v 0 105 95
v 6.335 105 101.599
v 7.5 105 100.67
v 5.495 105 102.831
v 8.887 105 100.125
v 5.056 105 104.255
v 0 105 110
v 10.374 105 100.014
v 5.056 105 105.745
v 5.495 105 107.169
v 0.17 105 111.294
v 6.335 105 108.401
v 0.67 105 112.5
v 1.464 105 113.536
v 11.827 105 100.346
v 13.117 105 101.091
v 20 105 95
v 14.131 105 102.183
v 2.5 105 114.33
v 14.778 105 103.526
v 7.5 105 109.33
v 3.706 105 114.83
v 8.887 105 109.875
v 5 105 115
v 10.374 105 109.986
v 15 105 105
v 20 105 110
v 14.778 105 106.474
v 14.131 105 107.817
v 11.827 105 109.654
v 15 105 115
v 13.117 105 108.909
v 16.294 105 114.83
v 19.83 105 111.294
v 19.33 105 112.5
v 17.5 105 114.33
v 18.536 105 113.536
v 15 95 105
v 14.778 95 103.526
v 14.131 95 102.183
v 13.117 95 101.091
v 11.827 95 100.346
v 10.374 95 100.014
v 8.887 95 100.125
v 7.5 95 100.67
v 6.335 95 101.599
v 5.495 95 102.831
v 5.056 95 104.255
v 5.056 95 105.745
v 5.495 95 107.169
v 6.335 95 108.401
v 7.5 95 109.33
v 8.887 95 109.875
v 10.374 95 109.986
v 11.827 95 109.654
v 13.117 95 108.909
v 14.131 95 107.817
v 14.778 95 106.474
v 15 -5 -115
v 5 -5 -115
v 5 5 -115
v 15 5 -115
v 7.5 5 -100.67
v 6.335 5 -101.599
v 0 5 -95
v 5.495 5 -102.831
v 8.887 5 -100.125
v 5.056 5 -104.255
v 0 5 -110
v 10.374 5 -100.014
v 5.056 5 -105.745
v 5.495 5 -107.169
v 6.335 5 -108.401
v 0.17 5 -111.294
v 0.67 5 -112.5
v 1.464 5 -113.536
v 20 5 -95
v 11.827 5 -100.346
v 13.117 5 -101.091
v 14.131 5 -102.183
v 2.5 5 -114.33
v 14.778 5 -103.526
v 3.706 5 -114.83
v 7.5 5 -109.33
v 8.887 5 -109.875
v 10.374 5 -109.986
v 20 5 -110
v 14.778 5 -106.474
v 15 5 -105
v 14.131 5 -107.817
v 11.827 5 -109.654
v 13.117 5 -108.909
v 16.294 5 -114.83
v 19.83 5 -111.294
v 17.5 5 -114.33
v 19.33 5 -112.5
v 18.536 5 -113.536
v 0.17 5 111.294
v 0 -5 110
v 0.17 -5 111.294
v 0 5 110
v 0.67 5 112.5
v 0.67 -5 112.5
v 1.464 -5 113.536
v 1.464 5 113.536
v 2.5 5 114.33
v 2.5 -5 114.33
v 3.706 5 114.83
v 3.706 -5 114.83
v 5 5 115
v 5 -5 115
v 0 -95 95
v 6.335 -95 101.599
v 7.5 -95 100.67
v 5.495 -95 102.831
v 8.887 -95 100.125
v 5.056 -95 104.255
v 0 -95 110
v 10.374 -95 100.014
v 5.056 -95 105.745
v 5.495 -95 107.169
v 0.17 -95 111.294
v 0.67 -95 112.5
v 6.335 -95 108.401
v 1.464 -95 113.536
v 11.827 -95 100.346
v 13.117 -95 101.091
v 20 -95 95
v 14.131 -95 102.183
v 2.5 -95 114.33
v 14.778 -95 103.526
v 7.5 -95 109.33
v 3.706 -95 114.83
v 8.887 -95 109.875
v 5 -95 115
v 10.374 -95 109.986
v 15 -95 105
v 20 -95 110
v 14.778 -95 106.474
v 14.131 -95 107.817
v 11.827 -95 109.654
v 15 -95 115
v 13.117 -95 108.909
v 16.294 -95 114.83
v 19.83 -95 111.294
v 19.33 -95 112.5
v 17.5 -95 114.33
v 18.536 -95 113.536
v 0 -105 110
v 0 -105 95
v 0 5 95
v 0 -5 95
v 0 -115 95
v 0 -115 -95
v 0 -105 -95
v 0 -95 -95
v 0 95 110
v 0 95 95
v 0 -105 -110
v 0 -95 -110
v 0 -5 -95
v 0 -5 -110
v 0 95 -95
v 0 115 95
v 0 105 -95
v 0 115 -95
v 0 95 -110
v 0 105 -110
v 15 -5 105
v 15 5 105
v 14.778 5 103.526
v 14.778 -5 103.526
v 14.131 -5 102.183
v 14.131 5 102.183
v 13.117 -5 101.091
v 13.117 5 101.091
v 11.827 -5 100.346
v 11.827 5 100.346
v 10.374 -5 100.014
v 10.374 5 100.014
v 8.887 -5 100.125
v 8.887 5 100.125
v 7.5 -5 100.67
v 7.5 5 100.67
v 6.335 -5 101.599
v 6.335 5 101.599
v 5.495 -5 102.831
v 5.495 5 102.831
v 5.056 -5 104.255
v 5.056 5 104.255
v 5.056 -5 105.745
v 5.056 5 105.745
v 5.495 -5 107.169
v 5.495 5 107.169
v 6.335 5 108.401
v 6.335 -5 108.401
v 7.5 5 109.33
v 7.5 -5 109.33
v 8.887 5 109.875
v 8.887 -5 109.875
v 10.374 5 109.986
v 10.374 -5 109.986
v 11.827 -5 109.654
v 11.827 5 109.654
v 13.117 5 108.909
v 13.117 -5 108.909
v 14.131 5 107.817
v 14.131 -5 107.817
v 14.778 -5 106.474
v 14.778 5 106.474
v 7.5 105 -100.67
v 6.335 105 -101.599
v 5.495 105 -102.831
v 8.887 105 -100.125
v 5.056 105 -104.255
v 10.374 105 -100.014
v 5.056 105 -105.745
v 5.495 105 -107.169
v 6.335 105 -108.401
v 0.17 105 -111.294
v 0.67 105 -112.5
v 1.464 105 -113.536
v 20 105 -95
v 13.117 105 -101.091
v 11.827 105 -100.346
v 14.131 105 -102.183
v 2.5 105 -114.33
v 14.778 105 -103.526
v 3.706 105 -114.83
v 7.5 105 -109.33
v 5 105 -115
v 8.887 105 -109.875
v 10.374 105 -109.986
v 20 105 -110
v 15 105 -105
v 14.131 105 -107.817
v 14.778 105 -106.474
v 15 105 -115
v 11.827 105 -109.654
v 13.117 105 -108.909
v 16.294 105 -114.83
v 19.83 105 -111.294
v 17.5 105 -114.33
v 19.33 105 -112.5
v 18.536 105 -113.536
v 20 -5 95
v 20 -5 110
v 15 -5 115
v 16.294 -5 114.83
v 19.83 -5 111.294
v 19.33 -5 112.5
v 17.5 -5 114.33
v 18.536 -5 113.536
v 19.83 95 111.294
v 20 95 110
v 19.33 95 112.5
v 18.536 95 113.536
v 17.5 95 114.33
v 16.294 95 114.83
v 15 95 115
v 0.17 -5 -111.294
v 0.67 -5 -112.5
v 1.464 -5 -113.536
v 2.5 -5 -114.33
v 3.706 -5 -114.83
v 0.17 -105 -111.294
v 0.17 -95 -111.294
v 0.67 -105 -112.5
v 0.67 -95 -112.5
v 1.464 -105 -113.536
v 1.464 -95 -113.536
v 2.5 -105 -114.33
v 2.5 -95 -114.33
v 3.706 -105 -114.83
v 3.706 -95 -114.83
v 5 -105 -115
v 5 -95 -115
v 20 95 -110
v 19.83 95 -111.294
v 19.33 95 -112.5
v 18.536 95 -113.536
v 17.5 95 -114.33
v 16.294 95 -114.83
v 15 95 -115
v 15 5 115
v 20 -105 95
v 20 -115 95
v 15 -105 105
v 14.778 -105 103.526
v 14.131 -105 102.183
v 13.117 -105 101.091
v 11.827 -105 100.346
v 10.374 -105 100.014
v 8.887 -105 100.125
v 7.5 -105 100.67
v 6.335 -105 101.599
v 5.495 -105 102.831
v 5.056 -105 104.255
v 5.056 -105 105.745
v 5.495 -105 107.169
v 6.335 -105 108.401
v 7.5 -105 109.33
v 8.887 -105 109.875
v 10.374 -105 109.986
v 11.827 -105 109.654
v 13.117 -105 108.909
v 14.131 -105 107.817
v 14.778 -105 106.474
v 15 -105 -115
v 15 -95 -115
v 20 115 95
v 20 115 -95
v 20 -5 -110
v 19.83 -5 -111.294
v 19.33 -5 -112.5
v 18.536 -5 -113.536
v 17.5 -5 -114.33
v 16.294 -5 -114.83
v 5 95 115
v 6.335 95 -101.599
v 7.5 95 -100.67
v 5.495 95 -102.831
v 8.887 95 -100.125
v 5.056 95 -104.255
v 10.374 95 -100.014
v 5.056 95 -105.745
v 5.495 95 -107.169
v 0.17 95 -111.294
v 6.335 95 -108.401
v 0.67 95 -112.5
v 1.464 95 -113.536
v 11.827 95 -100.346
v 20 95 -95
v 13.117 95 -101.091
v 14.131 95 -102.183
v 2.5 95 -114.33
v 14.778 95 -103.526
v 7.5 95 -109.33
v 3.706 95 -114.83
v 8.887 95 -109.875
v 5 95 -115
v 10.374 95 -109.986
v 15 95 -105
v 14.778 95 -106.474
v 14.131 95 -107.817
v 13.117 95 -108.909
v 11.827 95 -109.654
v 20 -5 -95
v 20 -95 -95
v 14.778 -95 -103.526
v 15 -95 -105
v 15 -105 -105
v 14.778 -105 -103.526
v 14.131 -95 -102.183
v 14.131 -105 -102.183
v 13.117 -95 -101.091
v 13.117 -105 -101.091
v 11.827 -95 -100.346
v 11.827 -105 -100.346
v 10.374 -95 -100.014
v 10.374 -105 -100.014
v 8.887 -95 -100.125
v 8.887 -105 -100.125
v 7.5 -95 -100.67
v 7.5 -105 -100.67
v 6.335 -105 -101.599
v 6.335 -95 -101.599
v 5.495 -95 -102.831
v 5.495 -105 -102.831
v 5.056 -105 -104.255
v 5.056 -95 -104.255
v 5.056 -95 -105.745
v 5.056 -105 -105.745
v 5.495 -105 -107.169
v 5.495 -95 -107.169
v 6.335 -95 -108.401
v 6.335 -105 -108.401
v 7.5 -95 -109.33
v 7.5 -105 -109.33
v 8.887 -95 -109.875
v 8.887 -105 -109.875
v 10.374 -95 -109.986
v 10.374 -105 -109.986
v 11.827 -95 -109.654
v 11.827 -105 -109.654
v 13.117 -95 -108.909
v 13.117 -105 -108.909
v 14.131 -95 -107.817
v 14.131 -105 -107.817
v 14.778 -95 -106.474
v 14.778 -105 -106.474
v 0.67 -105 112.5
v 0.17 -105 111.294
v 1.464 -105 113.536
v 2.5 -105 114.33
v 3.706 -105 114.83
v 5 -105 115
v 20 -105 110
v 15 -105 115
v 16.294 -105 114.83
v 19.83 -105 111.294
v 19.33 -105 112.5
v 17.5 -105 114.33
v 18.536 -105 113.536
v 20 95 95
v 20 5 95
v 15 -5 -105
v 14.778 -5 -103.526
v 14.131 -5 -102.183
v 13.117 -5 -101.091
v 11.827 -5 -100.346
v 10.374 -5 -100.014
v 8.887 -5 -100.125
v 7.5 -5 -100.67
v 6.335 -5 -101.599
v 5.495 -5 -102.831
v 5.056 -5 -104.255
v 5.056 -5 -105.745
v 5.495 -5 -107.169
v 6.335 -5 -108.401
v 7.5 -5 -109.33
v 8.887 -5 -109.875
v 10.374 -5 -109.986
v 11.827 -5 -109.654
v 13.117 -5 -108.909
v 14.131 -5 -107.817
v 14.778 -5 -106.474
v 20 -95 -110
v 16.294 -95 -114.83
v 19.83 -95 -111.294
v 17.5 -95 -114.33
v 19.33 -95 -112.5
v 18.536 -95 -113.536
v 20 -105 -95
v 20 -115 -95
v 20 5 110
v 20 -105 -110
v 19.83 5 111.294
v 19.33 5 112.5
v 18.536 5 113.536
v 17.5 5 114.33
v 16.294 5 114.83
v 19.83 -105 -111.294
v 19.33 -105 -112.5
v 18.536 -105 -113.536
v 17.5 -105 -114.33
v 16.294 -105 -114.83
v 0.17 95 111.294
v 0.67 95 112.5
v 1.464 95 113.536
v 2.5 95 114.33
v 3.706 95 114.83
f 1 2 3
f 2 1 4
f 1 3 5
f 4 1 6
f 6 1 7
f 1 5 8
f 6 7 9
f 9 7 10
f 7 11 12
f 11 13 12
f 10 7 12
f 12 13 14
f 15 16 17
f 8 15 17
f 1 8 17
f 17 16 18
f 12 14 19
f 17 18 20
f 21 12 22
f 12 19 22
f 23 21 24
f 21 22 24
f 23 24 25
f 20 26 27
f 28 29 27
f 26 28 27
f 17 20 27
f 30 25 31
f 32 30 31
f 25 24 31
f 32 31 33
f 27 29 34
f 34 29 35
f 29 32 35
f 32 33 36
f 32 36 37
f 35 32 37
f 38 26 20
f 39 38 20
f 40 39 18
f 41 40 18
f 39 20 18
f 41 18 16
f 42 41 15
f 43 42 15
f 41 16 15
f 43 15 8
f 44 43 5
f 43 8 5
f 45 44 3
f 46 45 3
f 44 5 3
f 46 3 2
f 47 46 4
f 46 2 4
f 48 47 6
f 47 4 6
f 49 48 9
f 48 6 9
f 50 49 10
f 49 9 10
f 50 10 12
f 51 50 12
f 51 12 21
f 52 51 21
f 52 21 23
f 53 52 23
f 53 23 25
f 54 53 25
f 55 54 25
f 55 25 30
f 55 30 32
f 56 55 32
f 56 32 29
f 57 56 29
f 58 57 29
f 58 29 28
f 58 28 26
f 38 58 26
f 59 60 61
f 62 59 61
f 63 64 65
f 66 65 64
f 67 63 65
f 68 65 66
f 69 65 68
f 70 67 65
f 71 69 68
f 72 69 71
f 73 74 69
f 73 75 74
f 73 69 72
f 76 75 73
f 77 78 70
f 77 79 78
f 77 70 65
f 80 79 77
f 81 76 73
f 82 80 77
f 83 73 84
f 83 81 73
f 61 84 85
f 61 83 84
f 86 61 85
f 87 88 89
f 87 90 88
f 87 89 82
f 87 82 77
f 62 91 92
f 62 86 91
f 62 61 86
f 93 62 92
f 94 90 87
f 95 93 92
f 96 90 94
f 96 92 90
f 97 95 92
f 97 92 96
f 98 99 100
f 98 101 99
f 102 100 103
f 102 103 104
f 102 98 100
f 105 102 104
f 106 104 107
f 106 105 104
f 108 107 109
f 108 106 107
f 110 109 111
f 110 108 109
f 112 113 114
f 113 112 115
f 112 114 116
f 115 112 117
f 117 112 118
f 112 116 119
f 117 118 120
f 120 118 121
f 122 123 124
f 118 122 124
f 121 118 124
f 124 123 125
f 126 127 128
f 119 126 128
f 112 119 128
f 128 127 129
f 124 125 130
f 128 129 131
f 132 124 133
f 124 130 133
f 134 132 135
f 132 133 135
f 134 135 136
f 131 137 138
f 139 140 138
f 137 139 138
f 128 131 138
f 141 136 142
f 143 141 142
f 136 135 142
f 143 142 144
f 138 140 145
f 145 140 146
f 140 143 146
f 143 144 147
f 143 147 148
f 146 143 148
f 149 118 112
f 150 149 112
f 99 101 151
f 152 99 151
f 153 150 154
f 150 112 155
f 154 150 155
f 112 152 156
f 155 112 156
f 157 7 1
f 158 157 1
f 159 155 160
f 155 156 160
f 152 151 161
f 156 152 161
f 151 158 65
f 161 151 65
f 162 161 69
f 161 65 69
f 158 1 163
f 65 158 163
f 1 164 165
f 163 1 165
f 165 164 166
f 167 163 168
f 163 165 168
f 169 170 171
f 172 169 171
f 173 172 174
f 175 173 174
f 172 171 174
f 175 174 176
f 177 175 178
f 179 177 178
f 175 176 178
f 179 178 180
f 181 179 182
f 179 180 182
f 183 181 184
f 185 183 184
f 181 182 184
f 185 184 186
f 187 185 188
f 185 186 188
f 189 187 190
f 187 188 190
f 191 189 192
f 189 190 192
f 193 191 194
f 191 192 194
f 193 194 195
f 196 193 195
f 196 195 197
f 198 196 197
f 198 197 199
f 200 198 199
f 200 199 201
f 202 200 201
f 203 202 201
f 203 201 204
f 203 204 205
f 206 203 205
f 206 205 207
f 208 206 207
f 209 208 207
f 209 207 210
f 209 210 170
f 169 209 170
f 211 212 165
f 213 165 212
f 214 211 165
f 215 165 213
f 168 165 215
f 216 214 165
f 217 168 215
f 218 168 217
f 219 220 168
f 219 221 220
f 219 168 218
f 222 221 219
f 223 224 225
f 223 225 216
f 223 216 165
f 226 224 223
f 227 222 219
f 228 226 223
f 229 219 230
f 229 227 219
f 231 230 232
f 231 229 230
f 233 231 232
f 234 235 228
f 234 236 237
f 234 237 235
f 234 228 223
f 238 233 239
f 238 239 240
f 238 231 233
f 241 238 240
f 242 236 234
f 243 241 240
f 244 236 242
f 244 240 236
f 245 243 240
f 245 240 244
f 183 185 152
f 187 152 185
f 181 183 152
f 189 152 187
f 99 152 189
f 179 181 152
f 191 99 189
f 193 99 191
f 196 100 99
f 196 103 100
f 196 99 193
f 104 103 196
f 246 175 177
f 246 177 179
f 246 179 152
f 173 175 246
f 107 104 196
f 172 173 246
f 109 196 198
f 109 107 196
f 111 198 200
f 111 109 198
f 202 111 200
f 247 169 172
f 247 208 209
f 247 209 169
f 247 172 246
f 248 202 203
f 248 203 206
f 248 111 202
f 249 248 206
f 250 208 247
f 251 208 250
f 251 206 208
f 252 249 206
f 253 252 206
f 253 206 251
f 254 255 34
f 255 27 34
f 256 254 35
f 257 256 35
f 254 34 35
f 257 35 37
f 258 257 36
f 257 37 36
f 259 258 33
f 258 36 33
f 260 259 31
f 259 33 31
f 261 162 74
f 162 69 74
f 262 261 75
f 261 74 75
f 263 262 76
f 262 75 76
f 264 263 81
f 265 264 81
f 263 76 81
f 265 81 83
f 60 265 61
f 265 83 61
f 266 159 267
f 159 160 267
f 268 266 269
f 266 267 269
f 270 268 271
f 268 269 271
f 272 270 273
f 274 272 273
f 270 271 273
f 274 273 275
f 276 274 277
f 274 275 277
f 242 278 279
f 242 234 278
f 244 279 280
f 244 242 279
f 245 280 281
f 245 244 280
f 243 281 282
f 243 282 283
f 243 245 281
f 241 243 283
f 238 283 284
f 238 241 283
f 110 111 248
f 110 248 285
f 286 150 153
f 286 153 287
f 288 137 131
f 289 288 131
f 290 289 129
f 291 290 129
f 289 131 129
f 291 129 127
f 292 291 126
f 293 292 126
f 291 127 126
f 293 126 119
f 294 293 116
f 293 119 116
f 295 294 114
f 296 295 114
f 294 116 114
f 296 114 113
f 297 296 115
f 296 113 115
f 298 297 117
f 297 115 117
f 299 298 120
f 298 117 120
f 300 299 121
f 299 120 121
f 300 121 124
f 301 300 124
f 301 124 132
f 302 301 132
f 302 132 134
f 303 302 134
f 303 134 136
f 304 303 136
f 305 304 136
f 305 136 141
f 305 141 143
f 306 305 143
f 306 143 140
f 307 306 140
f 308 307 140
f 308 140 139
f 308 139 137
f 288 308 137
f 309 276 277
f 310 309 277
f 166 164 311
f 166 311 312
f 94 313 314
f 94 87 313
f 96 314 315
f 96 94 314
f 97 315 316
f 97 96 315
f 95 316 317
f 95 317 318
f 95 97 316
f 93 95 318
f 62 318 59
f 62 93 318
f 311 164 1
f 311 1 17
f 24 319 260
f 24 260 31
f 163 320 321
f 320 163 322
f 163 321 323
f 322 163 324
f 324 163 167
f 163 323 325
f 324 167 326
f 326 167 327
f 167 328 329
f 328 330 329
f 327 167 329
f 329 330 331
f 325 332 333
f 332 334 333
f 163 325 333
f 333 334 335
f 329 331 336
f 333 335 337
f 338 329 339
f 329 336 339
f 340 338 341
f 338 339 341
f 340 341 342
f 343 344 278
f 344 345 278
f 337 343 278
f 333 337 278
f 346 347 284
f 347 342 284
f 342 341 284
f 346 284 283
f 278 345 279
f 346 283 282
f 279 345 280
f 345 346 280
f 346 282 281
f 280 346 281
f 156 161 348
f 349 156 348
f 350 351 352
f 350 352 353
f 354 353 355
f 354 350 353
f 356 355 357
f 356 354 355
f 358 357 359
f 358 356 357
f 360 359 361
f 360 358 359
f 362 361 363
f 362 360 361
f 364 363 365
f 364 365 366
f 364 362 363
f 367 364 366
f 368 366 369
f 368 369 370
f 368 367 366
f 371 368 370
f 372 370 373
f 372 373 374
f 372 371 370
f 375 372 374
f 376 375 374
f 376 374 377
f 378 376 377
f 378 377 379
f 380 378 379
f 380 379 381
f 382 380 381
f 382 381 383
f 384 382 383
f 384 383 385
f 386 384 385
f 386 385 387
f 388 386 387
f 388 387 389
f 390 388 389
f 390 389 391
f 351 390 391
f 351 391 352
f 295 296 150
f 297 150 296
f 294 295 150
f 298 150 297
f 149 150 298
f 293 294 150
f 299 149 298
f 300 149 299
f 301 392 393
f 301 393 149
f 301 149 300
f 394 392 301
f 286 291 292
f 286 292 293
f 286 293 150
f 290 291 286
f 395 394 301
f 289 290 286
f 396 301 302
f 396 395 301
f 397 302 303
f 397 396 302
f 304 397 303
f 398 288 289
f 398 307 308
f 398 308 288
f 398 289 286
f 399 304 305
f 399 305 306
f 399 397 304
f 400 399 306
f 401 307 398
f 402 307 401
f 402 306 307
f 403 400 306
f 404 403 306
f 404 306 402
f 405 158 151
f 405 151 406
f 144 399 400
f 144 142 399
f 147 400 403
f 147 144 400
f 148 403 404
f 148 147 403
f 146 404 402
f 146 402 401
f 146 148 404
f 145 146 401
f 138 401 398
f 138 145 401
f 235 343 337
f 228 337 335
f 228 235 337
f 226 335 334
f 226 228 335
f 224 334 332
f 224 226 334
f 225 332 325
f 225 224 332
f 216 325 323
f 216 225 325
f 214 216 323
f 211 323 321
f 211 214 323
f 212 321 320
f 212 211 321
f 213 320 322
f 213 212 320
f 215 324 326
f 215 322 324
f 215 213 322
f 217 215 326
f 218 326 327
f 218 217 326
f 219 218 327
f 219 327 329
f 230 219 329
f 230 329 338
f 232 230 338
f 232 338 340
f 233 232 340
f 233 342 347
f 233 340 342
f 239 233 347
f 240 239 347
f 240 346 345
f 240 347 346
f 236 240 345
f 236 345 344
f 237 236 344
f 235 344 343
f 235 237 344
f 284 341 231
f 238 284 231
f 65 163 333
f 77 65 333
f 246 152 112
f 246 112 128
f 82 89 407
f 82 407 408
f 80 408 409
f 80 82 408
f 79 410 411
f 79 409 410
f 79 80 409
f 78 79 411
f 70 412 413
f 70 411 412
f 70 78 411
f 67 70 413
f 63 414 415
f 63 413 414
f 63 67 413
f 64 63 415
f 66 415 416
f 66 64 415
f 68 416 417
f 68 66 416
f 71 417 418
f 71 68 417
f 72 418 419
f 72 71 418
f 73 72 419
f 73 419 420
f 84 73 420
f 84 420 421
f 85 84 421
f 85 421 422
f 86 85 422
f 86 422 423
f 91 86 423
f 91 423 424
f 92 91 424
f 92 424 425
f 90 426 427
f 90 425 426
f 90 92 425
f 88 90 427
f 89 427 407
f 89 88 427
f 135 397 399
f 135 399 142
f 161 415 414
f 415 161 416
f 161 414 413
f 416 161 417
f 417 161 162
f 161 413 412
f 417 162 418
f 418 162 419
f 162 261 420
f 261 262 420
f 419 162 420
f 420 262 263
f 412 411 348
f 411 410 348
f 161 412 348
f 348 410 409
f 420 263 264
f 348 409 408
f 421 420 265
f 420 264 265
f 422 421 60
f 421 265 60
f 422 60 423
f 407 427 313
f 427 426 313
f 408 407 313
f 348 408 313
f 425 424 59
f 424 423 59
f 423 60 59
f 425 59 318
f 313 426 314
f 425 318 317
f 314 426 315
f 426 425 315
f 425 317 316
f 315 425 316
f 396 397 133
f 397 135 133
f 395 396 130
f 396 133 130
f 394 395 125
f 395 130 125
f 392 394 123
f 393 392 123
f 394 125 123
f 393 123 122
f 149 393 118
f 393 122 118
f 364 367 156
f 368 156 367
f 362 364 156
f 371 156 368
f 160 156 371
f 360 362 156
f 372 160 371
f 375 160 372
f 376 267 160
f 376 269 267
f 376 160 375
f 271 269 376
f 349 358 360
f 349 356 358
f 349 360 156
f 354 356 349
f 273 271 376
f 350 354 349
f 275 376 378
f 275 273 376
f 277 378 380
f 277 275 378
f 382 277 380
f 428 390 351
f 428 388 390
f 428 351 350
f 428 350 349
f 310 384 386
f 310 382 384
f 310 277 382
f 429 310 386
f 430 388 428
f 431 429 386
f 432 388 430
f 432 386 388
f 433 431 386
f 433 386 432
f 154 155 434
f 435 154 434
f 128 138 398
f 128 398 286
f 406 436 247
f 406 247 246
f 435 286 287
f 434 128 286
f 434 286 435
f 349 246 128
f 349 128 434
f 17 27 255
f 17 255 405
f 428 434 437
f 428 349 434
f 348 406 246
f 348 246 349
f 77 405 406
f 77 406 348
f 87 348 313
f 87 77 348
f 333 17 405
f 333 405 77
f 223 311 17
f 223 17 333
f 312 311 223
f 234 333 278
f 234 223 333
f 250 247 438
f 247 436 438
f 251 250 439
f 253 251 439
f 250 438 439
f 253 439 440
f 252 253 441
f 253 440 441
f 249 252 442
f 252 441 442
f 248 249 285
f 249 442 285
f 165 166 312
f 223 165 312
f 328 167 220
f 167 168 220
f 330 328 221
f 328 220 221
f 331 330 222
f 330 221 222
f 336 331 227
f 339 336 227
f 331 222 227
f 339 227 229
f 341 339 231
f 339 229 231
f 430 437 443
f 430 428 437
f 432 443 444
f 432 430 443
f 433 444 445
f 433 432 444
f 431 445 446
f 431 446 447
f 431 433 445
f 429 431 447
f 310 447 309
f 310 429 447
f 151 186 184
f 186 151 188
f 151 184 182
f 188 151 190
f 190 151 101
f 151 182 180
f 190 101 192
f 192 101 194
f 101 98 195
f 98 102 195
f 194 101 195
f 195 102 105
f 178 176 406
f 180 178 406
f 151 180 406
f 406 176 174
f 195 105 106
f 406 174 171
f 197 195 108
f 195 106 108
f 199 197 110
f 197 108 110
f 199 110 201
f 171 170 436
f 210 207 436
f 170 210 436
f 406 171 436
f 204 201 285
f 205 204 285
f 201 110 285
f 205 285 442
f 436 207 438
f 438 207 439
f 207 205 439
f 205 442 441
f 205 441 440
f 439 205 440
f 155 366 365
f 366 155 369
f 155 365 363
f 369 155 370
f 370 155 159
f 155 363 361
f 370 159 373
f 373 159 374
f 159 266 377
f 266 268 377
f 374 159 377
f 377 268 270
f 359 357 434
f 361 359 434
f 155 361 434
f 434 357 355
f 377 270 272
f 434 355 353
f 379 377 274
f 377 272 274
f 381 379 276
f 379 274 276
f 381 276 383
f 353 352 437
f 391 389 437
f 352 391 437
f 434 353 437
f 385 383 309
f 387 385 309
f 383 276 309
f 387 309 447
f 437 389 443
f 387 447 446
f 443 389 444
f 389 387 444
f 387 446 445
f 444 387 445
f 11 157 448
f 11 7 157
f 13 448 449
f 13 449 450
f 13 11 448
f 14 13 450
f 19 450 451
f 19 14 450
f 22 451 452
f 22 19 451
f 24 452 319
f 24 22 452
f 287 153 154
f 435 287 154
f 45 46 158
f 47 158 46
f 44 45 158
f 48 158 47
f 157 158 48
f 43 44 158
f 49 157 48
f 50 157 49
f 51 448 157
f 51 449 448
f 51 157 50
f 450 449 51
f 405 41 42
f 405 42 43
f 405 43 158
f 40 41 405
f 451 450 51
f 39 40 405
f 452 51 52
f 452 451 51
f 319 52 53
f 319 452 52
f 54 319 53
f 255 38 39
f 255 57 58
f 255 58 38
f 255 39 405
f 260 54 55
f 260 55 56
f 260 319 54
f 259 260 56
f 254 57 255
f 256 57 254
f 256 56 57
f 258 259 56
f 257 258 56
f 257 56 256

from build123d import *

# Parameters (mm, degrees)
SKETCH1_W           = 230
SKETCH1_H           = 230
BOSS_EXTRUDE1_DEPTH = 20
SKETCH2_W           = 20
SKETCH2_H           = 10
SKETCH2_H_2         = 90
CUT_EXTRUDE1_DEPTH  = 20
SKETCH3_R           = 5
CUT_EXTRUDE2_DEPTH  = 210
FILLET1_R           = 5
FILLET2_R           = 5


with BuildPart() as part:
    # Sketch1 → Boss-Extrude1 (new body)
    with BuildSketch(Plane(origin=(0, 0, 0), x_dir=(0, 0, -1), z_dir=(1, 0, 0))):
        Rectangle(SKETCH1_W, SKETCH1_H)
    extrude(amount=BOSS_EXTRUDE1_DEPTH)

    # Sketch2 → Cut-Extrude1 (cut)
    with BuildSketch(Plane.XY.offset(115)):
        with Locations((10, 110)):
            Rectangle(SKETCH2_W, SKETCH2_H)
        with Locations((10, 50)):
            Rectangle(SKETCH2_W, SKETCH2_H_2)
        with Locations((10, -50)):
            Rectangle(SKETCH2_W, SKETCH2_H_2)
        with Locations((10, -110)):
            Rectangle(SKETCH2_W, SKETCH2_H)
    cut_extrude1 = extrude(amount=-CUT_EXTRUDE1_DEPTH, mode=Mode.SUBTRACT)

    # Sketch3 → Cut-Extrude2 (cut)
    with BuildSketch(Plane(origin=(0, 105, 0), x_dir=(1, 0, 0), z_dir=(0, 1, 0))):
        with Locations((10, -105)):
            Circle(SKETCH3_R)
    cut_extrude2 = extrude(amount=-CUT_EXTRUDE2_DEPTH, mode=Mode.SUBTRACT)

    # Fillet1
    fillet1_edges = [part.edges().sort_by_distance(p)[0] for p in [
        (0, 100, 115),
        (0, 0, 115),
        (0, -100, 115),
        (20, 100, 115),
        (20, 0, 115),
        (20, -100, 115),
    ]]
    fillet(fillet1_edges, radius=FILLET1_R)

    # Mirror5: Cut-Extrude1, Cut-Extrude2 across plane
    add(cut_extrude1.mirror(Plane.XY), mode=Mode.SUBTRACT)
    add(cut_extrude2.mirror(Plane.XY), mode=Mode.SUBTRACT)

    # Fillet2
    fillet2_edges = [part.edges().sort_by_distance(p)[0] for p in [
        (0, -100, -115),
        (0, 0, -115),
        (0, 100, -115),
        (20, -100, -115),
        (20, 0, -115),
        (20, 100, -115),
    ]]
    fillet(fillet2_edges, radius=FILLET2_R)


solid = part.part
